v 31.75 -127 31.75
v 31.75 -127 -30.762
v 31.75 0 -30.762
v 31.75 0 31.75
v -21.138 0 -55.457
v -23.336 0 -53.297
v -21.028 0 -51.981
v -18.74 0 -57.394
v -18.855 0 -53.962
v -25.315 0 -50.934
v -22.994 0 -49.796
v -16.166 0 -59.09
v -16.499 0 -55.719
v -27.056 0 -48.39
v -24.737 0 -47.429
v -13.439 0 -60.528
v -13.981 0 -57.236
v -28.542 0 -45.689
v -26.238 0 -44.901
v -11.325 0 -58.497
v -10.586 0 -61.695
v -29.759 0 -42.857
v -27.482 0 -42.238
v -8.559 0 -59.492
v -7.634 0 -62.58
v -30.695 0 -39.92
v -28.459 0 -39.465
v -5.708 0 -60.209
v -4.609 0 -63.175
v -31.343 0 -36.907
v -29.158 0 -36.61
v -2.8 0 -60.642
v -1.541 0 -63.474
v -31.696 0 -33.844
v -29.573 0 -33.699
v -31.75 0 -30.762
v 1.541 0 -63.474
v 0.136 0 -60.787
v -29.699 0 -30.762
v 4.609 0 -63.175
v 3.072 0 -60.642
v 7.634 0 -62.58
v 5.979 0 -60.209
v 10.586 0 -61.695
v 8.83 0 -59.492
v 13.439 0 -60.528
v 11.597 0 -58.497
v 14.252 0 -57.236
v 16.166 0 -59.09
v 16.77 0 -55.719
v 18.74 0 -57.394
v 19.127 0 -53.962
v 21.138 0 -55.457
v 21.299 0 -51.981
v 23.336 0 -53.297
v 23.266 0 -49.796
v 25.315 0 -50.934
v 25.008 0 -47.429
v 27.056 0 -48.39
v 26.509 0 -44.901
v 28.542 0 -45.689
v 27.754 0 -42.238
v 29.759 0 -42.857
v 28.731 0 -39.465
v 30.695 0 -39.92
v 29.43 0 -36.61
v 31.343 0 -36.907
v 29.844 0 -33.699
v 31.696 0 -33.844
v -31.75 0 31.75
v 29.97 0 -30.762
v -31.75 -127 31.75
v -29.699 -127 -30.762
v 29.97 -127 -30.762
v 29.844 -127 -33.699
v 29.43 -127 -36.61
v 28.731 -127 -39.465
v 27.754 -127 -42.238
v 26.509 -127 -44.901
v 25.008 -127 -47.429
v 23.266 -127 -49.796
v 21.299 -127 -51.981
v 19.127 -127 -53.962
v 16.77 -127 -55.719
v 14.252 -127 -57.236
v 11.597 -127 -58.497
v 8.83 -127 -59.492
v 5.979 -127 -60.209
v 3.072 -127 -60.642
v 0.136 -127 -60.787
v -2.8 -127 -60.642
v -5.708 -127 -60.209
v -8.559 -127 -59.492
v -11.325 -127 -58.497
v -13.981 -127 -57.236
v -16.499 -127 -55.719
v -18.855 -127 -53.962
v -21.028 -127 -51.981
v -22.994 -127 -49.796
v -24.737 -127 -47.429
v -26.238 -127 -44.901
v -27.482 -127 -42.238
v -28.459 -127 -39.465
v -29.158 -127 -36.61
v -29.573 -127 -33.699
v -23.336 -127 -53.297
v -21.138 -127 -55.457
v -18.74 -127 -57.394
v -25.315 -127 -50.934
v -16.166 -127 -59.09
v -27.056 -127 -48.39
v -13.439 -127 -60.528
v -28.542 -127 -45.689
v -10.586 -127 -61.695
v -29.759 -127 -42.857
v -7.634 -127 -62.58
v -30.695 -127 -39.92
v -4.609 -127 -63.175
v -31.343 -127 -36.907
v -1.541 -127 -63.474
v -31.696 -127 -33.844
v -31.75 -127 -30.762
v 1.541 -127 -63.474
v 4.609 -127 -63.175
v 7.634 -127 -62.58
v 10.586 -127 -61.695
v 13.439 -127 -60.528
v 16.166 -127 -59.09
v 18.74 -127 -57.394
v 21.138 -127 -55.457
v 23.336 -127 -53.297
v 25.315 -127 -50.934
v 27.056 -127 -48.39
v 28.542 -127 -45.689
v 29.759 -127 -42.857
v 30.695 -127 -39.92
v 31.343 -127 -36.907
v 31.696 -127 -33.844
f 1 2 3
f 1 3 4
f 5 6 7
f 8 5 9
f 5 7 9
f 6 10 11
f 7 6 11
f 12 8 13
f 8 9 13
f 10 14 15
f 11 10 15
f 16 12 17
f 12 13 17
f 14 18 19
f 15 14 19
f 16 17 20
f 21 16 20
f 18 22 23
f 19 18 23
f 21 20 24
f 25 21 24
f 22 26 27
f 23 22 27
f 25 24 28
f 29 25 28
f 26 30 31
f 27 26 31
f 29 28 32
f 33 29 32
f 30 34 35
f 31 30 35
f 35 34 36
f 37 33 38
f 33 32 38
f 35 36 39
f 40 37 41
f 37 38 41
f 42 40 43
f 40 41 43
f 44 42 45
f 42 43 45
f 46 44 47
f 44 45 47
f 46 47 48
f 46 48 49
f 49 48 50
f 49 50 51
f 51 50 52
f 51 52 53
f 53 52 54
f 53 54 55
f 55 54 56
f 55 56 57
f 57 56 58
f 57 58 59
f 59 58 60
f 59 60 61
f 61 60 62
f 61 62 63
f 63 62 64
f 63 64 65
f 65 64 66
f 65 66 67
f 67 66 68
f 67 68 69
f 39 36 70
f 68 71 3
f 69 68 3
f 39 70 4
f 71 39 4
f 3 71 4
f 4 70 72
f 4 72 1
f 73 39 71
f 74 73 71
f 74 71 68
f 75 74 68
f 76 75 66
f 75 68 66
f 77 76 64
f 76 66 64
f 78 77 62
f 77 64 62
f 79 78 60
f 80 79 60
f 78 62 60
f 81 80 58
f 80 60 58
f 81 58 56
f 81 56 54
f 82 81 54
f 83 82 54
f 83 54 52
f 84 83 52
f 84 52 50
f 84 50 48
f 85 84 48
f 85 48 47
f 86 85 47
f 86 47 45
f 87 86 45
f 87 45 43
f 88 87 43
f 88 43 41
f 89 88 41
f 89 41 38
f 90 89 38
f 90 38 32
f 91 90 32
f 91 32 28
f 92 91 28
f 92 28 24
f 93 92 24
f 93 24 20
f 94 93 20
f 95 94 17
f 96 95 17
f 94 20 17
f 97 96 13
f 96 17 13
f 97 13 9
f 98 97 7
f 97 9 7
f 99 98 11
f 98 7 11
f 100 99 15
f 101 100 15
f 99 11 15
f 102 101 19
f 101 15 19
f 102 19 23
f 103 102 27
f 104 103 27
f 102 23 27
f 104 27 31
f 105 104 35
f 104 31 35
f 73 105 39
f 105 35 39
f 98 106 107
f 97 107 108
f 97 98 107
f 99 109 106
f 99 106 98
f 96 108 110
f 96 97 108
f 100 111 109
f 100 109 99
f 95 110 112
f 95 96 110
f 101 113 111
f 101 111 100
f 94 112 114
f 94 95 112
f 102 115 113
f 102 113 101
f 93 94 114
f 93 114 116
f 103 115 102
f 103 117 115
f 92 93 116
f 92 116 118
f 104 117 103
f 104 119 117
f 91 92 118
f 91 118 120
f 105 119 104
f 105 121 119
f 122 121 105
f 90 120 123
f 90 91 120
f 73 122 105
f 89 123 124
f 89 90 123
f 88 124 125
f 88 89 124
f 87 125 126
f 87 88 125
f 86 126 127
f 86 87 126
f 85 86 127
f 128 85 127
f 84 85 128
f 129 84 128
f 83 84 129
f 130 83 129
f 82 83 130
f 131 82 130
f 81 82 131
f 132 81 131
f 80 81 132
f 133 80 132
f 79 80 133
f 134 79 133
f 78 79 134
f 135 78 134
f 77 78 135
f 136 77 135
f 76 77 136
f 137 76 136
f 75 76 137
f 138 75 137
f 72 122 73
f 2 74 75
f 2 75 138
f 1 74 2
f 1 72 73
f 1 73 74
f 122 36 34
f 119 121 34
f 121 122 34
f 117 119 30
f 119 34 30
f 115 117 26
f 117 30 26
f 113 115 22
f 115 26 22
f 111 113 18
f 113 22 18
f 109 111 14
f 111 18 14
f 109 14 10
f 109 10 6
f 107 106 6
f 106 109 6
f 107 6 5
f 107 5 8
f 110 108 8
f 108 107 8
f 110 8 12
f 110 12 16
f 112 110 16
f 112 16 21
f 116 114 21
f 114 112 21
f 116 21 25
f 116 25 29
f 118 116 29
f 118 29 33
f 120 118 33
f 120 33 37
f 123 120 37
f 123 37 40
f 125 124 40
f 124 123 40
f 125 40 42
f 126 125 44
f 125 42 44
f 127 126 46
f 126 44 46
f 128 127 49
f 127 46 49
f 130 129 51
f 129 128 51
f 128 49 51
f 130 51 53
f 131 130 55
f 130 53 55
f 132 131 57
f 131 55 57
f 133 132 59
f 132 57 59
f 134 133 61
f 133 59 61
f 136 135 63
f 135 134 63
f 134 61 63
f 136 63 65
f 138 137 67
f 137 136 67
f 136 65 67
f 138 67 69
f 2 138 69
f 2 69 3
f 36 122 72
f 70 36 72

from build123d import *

# Parameters (mm, degrees)
F0_W     = 63.5
F0_H     = 63.5
F1_DEPTH = 127
F2_R     = 31.765228
F3_DEPTH = 127
F5_DEPTH = 152.4


with BuildPart() as f1:
    # F0 (on Front) → F1 (new body)
    with BuildSketch(Plane.XZ):
        Rectangle(F0_W, F0_H)
    extrude(amount=F1_DEPTH)

    # F2 (on Front) → F3 (join)
    with BuildSketch(Plane.XZ):
        with Locations((0, -31.745933)):
            Circle(F2_R)
    extrude(amount=F3_DEPTH)

    # F4 (on face) → F5 (cut)
    with BuildSketch(Plane(origin=(0, 0, 0), x_dir=(-1, 0, 0), z_dir=(0, 1, 0))):
        with BuildLine():
            Line((29.699003, -30.762452), (-29.970478, -30.762452))
            ThreePointArc((-29.970478, -30.762452), (-0.135737, -60.78653), (29.699003, -30.762452))
        make_face()
    extrude(amount=-F5_DEPTH, mode=Mode.SUBTRACT)


solid = f1.part
